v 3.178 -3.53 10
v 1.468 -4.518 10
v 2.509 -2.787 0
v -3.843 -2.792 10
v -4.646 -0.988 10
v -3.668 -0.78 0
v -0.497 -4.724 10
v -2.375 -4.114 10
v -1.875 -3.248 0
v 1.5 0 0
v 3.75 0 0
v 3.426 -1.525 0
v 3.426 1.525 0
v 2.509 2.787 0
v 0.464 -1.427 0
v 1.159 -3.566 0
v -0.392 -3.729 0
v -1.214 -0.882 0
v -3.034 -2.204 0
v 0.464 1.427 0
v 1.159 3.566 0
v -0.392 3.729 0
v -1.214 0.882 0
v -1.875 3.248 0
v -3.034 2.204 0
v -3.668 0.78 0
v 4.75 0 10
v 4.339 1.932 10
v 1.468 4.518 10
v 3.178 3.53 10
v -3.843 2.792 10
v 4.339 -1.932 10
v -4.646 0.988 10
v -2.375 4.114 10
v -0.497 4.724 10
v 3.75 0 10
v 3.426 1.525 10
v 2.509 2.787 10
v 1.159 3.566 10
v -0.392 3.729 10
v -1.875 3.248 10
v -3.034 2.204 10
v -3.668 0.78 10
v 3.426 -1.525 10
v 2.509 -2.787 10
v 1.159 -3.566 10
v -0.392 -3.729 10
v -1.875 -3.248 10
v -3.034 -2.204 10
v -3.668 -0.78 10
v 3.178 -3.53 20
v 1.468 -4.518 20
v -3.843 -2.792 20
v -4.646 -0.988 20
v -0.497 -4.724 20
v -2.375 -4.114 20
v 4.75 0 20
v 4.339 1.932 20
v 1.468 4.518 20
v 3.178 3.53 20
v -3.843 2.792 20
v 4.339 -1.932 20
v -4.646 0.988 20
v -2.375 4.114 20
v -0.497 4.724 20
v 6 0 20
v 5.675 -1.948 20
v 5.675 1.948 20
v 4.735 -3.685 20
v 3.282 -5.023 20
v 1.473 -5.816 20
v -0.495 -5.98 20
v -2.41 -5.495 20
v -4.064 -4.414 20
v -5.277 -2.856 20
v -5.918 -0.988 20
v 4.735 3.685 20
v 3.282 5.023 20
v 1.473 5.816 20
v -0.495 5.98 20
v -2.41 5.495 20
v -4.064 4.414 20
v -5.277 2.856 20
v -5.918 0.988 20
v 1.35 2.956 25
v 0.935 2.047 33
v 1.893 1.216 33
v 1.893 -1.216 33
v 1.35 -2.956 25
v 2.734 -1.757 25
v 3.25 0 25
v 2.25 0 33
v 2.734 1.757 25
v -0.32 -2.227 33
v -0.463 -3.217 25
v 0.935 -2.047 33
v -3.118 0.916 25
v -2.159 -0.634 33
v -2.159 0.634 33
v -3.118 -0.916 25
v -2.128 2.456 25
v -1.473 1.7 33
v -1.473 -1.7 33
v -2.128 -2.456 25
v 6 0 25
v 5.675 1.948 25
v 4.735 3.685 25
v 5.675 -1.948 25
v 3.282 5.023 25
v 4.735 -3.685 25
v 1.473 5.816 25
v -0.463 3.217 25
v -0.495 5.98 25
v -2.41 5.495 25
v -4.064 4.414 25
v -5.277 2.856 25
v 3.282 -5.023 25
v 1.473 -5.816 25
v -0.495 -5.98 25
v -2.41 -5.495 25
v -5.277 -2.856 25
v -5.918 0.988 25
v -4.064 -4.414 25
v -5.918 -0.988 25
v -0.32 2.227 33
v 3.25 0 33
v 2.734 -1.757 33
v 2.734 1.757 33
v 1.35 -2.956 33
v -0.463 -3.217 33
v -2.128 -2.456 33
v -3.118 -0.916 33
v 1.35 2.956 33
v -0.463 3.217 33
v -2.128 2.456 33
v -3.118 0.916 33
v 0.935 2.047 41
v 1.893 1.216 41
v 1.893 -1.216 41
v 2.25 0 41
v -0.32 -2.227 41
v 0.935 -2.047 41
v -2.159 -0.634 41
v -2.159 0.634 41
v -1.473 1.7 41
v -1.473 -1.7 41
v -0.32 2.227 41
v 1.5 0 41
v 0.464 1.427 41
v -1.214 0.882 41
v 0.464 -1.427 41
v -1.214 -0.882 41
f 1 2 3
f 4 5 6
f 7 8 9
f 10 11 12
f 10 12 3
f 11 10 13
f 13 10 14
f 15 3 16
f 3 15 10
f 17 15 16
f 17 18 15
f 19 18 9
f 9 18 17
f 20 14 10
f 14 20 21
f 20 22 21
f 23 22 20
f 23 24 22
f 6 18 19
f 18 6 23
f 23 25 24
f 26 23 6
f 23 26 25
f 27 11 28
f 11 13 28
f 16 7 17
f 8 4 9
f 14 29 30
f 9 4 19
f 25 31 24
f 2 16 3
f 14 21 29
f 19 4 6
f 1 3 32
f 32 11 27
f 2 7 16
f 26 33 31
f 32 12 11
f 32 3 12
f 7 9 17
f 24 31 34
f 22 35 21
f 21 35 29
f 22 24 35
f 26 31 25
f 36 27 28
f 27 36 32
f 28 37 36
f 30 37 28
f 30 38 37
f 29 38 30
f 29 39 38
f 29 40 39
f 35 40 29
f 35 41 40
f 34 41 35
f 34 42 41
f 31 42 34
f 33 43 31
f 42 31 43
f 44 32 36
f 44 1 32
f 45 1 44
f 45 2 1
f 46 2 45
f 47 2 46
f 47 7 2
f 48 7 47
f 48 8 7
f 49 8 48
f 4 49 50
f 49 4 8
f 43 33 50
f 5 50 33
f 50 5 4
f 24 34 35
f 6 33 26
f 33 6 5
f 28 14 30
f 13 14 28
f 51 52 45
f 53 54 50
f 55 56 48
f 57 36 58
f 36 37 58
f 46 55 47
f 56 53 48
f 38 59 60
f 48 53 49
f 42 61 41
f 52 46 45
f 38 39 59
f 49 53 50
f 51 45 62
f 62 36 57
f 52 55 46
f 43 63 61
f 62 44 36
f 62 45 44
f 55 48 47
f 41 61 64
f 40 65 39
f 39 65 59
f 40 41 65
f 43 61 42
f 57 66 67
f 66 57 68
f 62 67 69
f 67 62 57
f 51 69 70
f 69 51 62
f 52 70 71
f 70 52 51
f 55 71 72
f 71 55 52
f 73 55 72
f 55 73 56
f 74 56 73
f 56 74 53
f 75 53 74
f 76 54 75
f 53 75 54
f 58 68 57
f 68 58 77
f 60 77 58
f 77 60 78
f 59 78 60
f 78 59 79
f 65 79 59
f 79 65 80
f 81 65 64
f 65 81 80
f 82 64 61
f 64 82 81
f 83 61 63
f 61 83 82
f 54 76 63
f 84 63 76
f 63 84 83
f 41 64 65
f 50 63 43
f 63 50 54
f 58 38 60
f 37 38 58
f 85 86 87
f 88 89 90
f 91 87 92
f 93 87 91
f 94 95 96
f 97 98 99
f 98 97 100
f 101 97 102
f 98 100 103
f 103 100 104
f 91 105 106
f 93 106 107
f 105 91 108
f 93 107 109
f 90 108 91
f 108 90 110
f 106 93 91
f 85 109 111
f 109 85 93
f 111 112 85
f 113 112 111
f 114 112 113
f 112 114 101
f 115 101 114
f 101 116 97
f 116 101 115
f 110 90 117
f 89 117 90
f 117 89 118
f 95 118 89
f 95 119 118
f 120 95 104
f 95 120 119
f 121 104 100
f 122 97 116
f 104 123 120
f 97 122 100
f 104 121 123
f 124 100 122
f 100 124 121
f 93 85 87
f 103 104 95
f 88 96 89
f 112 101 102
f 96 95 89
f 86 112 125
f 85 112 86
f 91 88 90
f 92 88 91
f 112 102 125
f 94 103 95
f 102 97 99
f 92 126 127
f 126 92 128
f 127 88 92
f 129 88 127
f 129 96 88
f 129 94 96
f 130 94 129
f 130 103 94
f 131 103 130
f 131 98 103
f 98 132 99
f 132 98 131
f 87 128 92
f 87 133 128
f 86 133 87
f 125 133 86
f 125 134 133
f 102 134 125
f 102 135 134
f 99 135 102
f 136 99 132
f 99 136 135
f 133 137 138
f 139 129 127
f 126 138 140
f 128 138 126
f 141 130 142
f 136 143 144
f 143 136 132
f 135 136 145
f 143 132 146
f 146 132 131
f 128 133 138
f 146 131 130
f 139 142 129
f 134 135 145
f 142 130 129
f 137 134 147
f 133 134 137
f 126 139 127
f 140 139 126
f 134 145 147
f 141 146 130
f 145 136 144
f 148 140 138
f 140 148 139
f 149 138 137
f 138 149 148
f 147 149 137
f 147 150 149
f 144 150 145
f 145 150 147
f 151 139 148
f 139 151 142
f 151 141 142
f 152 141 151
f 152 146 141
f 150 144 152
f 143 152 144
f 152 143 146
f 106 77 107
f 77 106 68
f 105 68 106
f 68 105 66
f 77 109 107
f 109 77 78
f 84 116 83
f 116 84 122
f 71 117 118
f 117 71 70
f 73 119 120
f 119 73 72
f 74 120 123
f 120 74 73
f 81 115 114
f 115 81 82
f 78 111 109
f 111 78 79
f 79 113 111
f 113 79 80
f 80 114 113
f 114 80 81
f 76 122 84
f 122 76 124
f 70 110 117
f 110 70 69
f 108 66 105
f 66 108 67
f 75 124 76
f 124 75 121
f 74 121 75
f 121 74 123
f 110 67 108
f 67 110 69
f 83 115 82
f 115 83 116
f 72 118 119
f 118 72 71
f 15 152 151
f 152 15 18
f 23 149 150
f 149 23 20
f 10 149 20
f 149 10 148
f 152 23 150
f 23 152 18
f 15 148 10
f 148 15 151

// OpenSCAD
// Tubing hose-barb reducer: joins 8 mm ID silicone tubing to 5 mm ID silicone tubing
// Print orientation: standing upright along +Z, resting on z = 0

// ---------------- Parameters ----------------
// Barbs for 8 mm tubing (z = 0 to 20)
barb_8_h      = 10;   // barb height
barb_8_d0     = 7.5;  // outer diameter at bottom of barb
barb_8_d1     = 9.5;  // outer diameter at top of barb
barb_8_n      = 2;    // number of stacked barbs

// Collar (z = 20 to 25)
collar_d      = 12;    // collar outer diameter

// Barbs for 5 mm tubing (z = 25 to 41)
barb_5_h      = 8;     // barb height
barb_5_d0     = 6.5;   // outer diameter at bottom of barb
barb_5_d1     = 4.5;   // outer diameter at top of barb
barb_5_n      = 2;     // number of stacked barbs

// Through bore
bore_d        = 3;     // through-bore diameter

// ---------------- Model ----------------
difference() {
    union() {
        // 8 mm tubing barbs, stacked, sawtooth profile
        for (i = [0 : barb_8_n - 1]) {
            translate([0, 0, i * barb_8_h])
                cylinder(h = barb_8_h, d1 = barb_8_d0, d2 = barb_8_d1);
        }

        // Cylindrical collar
        translate([0, 0, 20])
            cylinder(h = 5, d = collar_d);

        // 5 mm tubing barbs, stacked, shrinking profile
        for (i = [0 : barb_5_n - 1]) {
            translate([0, 0, 25 + i * barb_5_h])
                cylinder(h = barb_5_h, d1 = barb_5_d0, d2 = barb_5_d1);
        }
    }

    // Through bore, extended past both end faces
    translate([0, 0, -1])
        cylinder(h = 42, d = bore_d);
}
